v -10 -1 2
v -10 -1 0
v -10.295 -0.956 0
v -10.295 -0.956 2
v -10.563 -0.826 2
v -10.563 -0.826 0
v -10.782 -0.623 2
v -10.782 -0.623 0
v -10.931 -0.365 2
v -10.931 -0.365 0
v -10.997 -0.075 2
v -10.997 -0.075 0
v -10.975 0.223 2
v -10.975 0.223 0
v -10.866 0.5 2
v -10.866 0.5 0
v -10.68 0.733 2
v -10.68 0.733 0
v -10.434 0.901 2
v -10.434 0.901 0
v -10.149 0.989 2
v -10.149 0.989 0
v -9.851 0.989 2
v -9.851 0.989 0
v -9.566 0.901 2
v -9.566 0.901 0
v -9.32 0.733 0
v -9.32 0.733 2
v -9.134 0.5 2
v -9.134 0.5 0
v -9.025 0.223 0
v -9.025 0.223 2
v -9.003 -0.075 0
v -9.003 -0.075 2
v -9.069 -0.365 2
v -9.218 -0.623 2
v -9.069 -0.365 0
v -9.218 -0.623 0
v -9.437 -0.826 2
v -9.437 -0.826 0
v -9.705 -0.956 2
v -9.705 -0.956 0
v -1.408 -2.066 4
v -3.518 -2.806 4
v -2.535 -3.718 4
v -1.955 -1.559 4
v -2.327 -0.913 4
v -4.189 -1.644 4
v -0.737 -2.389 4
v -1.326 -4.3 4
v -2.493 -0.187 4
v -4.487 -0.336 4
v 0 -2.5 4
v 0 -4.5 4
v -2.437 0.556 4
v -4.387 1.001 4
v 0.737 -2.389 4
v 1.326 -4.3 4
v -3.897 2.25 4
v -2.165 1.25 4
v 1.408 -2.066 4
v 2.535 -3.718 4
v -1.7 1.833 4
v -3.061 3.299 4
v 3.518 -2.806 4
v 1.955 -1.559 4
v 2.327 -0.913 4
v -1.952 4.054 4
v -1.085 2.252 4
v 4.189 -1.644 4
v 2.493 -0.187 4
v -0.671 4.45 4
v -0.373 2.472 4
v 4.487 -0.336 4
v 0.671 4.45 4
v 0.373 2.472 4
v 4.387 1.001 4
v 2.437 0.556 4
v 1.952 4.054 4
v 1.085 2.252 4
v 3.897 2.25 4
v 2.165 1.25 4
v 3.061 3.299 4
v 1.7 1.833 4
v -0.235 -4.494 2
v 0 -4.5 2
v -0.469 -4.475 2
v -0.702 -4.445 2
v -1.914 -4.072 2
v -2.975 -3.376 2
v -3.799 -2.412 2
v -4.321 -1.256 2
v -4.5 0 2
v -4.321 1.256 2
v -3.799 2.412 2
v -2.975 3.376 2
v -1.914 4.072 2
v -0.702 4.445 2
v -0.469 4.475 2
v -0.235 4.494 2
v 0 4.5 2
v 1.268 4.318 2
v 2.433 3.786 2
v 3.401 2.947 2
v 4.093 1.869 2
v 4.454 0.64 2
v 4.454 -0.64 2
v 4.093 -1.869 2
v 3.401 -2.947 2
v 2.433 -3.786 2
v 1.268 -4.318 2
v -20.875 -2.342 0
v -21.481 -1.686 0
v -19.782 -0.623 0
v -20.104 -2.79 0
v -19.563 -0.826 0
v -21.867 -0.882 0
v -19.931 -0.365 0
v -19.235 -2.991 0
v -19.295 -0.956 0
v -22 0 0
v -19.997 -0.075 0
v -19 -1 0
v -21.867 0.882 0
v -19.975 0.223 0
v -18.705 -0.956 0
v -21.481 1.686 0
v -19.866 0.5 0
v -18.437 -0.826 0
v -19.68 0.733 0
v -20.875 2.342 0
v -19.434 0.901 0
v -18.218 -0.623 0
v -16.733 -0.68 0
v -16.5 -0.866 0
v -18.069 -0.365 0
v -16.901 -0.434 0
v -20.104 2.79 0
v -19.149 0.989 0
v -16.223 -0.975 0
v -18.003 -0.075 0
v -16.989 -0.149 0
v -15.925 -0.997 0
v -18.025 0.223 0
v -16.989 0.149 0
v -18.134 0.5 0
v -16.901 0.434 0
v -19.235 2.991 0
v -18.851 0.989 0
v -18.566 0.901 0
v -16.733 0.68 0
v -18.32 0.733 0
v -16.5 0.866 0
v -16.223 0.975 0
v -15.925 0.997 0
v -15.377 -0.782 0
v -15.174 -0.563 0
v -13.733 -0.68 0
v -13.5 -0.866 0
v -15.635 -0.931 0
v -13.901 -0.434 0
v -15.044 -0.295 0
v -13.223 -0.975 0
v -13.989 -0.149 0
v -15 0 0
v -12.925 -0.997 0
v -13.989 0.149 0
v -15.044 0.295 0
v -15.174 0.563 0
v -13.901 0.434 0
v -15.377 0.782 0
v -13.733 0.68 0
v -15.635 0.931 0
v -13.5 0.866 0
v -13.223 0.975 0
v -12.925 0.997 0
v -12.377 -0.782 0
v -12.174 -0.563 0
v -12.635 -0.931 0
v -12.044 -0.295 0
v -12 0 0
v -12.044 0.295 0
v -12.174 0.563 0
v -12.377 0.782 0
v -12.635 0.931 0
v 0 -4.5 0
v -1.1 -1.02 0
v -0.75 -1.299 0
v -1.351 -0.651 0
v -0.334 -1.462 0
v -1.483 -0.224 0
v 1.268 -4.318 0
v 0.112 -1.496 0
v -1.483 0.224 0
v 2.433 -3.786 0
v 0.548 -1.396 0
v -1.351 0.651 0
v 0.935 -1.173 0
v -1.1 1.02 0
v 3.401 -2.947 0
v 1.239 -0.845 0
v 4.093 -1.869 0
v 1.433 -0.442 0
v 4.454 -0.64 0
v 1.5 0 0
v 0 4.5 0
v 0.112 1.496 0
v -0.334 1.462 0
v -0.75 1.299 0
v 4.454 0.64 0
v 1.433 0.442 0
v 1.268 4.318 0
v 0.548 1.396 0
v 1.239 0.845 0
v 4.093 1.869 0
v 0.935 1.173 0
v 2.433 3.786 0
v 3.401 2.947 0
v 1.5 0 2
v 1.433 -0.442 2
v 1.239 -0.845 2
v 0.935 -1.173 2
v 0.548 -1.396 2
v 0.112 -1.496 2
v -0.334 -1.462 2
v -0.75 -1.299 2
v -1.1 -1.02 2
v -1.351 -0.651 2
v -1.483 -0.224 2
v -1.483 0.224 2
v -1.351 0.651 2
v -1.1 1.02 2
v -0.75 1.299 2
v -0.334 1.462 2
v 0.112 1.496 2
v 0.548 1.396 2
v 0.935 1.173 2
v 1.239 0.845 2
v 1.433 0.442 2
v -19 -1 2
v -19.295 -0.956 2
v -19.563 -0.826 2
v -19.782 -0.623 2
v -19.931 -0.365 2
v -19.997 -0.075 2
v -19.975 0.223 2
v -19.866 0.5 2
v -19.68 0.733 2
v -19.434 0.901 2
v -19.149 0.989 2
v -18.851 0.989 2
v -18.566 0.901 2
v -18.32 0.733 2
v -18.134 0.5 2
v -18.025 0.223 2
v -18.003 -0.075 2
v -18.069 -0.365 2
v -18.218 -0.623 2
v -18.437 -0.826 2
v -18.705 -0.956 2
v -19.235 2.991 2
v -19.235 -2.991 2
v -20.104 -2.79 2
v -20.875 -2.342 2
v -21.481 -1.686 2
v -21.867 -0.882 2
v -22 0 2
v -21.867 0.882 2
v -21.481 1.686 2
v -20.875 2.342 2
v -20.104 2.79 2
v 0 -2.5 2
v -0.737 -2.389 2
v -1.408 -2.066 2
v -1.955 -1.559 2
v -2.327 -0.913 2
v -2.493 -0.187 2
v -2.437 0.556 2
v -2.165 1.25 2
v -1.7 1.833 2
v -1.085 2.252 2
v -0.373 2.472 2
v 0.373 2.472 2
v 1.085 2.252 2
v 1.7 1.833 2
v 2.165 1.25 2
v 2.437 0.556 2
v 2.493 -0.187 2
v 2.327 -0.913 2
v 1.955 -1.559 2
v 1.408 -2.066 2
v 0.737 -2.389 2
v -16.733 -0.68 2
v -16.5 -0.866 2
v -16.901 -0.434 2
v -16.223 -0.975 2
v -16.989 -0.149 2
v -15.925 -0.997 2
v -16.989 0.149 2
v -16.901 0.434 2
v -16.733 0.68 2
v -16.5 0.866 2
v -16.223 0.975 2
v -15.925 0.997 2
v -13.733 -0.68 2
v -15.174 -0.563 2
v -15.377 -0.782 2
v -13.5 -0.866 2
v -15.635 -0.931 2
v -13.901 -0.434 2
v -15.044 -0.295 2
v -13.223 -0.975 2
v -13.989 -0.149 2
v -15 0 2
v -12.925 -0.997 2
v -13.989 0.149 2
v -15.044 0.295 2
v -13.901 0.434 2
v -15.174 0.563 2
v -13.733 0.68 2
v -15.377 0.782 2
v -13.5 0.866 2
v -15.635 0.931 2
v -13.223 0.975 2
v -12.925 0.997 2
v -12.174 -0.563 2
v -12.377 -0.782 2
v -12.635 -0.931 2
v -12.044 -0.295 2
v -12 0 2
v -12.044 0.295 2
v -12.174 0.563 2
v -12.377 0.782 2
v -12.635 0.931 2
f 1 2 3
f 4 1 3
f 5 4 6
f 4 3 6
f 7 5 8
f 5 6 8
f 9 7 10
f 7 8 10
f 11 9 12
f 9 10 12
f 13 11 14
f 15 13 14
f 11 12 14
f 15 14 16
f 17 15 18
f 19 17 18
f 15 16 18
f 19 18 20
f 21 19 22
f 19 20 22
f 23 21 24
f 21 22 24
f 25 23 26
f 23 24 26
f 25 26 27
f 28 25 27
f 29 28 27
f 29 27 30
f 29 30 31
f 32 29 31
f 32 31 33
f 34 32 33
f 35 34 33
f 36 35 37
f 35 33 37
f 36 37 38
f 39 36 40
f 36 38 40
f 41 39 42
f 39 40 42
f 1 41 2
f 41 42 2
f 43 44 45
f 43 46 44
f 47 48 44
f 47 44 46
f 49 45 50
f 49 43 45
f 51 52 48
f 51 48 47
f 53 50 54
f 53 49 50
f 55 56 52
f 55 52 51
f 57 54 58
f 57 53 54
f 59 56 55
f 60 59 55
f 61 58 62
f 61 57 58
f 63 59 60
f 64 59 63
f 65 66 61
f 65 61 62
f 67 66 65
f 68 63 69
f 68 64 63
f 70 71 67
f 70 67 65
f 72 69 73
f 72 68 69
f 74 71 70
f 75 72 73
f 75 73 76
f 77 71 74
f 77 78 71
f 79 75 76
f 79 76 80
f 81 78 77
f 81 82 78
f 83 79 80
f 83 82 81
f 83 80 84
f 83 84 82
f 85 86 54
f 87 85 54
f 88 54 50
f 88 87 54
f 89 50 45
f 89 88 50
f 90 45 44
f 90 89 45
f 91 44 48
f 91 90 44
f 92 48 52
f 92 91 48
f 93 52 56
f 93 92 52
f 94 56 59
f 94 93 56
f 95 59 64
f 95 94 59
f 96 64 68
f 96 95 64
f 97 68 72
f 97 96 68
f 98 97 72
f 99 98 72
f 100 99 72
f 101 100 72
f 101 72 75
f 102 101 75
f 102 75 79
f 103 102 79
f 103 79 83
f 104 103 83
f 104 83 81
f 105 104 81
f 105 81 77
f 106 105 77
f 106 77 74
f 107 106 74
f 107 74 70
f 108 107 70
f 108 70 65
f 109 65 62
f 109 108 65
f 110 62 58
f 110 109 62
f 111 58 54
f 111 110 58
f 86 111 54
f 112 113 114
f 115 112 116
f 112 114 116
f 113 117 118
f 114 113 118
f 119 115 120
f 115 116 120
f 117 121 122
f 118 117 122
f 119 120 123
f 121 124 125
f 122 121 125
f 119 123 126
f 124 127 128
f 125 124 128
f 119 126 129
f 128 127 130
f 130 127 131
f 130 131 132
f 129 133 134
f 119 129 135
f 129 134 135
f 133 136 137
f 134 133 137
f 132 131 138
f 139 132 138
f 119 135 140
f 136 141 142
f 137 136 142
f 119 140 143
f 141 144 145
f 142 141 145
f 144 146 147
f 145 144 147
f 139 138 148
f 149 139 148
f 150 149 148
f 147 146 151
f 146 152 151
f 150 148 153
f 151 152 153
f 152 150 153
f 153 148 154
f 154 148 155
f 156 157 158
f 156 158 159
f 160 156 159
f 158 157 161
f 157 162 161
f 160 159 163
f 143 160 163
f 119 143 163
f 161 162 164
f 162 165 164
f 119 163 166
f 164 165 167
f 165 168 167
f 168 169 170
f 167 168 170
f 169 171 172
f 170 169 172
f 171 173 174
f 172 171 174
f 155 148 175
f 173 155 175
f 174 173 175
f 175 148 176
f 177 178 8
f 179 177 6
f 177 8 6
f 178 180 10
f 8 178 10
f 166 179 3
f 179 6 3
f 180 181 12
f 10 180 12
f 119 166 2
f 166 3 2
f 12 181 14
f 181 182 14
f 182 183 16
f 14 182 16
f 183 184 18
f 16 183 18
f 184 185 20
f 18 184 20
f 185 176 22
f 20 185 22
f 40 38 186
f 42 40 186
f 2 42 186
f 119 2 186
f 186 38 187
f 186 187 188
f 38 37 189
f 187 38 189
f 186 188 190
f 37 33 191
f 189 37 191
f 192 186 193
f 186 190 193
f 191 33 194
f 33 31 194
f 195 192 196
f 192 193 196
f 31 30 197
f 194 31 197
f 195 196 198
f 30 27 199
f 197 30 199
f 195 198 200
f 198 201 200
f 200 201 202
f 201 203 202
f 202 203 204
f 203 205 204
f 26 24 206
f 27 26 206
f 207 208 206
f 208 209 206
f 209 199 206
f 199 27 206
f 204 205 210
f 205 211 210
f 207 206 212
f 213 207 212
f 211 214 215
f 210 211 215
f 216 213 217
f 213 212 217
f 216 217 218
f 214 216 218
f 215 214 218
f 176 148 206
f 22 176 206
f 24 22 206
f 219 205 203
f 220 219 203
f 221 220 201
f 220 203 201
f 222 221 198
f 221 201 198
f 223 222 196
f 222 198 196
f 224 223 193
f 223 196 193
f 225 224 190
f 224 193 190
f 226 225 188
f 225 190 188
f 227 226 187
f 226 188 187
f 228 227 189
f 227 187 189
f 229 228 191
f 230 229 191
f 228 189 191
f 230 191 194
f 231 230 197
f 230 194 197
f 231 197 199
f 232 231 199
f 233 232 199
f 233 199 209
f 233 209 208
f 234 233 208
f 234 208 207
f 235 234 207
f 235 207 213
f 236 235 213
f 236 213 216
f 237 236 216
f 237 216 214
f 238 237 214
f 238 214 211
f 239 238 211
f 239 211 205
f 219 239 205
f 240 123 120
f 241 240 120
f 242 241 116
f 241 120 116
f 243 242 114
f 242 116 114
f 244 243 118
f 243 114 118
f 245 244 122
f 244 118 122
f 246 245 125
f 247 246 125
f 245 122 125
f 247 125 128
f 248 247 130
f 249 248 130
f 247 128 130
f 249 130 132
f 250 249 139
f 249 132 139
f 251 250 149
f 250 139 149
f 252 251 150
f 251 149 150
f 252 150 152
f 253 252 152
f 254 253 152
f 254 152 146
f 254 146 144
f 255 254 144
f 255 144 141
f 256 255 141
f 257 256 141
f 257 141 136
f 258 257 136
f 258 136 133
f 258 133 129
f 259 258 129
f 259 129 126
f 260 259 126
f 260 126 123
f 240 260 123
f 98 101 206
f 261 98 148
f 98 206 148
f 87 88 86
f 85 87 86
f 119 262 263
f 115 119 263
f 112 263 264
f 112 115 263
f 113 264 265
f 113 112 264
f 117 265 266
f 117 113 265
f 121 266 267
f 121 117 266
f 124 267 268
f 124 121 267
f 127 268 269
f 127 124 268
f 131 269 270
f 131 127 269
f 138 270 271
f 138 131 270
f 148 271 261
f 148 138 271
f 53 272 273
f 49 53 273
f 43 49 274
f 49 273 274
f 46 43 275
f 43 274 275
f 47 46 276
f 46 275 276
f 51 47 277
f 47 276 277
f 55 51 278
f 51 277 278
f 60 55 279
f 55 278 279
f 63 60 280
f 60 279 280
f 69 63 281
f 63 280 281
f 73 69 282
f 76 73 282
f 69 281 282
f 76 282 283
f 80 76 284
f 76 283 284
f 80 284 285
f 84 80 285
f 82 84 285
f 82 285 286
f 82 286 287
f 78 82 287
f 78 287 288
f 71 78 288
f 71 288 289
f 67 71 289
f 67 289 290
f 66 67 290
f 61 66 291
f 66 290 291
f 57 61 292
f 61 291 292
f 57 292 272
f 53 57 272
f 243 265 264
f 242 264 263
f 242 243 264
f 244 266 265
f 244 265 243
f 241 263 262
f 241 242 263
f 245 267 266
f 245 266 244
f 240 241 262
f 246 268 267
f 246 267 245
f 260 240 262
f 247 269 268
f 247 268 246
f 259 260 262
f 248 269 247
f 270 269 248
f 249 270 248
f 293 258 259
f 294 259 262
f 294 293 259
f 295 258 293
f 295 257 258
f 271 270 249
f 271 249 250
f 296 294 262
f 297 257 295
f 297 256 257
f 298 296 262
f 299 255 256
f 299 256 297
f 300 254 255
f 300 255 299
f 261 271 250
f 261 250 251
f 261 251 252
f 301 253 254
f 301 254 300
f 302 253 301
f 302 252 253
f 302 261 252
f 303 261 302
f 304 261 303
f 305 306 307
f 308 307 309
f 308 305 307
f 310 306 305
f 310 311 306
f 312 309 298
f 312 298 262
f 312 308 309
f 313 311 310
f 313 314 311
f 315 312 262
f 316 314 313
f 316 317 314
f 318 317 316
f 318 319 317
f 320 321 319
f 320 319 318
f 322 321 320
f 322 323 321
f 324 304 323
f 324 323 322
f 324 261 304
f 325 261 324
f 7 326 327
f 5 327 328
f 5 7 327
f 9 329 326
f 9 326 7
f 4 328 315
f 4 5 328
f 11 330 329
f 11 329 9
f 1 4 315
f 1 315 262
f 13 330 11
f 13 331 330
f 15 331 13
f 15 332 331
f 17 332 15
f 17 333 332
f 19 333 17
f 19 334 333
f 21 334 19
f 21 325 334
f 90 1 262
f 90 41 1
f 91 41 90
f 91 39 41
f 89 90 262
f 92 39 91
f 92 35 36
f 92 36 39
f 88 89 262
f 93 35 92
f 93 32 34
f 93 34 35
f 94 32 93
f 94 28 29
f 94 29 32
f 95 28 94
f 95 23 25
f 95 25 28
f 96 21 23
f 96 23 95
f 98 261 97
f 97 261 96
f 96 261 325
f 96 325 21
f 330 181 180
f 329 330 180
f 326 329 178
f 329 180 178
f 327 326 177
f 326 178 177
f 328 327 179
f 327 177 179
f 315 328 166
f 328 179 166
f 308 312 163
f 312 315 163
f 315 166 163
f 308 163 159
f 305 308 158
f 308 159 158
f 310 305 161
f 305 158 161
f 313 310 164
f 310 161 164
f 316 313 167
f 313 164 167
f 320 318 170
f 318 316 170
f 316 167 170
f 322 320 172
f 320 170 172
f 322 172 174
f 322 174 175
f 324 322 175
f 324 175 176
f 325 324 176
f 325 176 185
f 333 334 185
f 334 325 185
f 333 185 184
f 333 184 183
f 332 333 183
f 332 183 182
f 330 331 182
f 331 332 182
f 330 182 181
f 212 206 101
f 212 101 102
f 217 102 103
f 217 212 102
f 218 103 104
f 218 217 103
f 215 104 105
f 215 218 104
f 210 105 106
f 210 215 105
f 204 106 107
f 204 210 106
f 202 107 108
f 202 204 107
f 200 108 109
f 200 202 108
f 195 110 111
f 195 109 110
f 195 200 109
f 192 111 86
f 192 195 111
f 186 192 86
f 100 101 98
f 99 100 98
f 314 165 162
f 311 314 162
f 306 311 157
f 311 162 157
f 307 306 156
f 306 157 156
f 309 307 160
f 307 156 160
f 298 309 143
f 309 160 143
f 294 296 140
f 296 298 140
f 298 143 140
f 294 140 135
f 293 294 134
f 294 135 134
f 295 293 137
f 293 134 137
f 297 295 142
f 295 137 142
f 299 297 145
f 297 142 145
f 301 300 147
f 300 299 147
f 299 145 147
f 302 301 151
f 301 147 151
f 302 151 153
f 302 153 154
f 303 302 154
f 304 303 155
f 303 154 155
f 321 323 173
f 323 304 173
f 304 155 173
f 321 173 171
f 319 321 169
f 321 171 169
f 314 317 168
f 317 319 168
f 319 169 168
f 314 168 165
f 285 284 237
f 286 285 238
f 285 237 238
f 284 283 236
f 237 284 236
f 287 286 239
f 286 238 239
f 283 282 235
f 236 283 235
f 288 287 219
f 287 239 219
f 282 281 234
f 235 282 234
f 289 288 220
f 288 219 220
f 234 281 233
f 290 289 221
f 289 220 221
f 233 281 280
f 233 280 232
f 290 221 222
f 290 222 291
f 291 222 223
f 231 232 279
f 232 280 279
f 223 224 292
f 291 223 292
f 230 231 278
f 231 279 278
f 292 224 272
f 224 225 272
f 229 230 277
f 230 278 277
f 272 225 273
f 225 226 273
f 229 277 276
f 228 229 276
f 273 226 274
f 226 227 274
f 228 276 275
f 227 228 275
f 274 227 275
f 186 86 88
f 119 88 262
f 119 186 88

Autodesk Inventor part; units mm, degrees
ref_plane "YZ Plane" through (0, 0, 0) normal (1, 0, 0) x (0, 1, 0)
ref_plane "XZ Plane" through (0, 0, 0) normal (0, 1, 0) x (-1, 0, 0)
ref_plane "XY Plane" through (0, 0, 0) normal (0, 0, 1) x (1, 0, 0)
sketch "Sketch1" plane through (0, 0, 0) normal (0, 0, 1) x (1, 0, 0)
  circle A0 centre (-16, 0) radius 1
  circle A1 centre (-13, 0) radius 1
  circle A2 centre (0, 0) radius 1.5
  arc A3 (-19.2347, 2.9908) -> (-19.2347, -2.9908) centre (-19, 0) ccw
  arc A4 (-0.7018, -4.4449) -> (-0.7018, 4.4449) centre (0, 0) ccw
  line L0 (0, -4.5) -> (-19.2347, -2.9908)
  line L1 (0, 4.5) -> (-19.2347, 2.9908)
  dimension "d1" = 2
  dimension "d2" = 2
  dimension "d3" = 3
  dimension "d6" = 3
  dimension "d8" = 6
  dimension "d9" = 9
  dimension "d10" = 3
extrude "Extrusion1" add sketch "Sketch1" along normal blind 2 contours L1 A4 L0 A3
sketch "Sketch2" plane through (0, 0, 2) normal (0, 0, 1) x (1, 0, 0)
  circle A0 centre (0, 0) radius 1.5 projected
  arc A1 (0, -4.5) -> (0, 4.5) centre (0, 0) ccw projected
  circle A2 centre (0, 0) radius 4.5
  dimension "d13" = 9
extrude "Extrusion2" add sketch "Sketch2" along normal blind 2
sketch "Sketch3" plane through (0, 0, 4) normal (0, 0, 1) x (1, 0, 0)
  circle A0 centre (0, 0) radius 1.5 projected
  circle A1 centre (0, 0) radius 4.5 projected
  circle A2 centre (0, 0) radius 2.5
  dimension "d16" = 5
hole "Hole1" at (0, 0, 4) direction (0, 0, -1) diameter 5 depth 2
sketch "Sketch4" plane through (0, 0, 2) normal (0, 0, 1) x (1, 0, 0)
  arc A0 (-19.2347, 2.9908) -> (-19.2347, -2.9908) centre (-19, 0) ccw projected
  circle A1 centre (-16, 0) radius 1 projected
  circle A2 centre (-13, 0) radius 1 projected
  circle A3 centre (-19, 0) radius 1
  circle A4 centre (-10, 0) radius 1
  dimension "d24" = 2
  dimension "d25" = 2
  dimension "d26" = 3
  dimension "d27" = 3
hole "Hole2" at (-19, 0, 2) at (-10, 0, 2) direction (0, 0, -1) diameter 2 end through all
properties part number "horn aluminium"
